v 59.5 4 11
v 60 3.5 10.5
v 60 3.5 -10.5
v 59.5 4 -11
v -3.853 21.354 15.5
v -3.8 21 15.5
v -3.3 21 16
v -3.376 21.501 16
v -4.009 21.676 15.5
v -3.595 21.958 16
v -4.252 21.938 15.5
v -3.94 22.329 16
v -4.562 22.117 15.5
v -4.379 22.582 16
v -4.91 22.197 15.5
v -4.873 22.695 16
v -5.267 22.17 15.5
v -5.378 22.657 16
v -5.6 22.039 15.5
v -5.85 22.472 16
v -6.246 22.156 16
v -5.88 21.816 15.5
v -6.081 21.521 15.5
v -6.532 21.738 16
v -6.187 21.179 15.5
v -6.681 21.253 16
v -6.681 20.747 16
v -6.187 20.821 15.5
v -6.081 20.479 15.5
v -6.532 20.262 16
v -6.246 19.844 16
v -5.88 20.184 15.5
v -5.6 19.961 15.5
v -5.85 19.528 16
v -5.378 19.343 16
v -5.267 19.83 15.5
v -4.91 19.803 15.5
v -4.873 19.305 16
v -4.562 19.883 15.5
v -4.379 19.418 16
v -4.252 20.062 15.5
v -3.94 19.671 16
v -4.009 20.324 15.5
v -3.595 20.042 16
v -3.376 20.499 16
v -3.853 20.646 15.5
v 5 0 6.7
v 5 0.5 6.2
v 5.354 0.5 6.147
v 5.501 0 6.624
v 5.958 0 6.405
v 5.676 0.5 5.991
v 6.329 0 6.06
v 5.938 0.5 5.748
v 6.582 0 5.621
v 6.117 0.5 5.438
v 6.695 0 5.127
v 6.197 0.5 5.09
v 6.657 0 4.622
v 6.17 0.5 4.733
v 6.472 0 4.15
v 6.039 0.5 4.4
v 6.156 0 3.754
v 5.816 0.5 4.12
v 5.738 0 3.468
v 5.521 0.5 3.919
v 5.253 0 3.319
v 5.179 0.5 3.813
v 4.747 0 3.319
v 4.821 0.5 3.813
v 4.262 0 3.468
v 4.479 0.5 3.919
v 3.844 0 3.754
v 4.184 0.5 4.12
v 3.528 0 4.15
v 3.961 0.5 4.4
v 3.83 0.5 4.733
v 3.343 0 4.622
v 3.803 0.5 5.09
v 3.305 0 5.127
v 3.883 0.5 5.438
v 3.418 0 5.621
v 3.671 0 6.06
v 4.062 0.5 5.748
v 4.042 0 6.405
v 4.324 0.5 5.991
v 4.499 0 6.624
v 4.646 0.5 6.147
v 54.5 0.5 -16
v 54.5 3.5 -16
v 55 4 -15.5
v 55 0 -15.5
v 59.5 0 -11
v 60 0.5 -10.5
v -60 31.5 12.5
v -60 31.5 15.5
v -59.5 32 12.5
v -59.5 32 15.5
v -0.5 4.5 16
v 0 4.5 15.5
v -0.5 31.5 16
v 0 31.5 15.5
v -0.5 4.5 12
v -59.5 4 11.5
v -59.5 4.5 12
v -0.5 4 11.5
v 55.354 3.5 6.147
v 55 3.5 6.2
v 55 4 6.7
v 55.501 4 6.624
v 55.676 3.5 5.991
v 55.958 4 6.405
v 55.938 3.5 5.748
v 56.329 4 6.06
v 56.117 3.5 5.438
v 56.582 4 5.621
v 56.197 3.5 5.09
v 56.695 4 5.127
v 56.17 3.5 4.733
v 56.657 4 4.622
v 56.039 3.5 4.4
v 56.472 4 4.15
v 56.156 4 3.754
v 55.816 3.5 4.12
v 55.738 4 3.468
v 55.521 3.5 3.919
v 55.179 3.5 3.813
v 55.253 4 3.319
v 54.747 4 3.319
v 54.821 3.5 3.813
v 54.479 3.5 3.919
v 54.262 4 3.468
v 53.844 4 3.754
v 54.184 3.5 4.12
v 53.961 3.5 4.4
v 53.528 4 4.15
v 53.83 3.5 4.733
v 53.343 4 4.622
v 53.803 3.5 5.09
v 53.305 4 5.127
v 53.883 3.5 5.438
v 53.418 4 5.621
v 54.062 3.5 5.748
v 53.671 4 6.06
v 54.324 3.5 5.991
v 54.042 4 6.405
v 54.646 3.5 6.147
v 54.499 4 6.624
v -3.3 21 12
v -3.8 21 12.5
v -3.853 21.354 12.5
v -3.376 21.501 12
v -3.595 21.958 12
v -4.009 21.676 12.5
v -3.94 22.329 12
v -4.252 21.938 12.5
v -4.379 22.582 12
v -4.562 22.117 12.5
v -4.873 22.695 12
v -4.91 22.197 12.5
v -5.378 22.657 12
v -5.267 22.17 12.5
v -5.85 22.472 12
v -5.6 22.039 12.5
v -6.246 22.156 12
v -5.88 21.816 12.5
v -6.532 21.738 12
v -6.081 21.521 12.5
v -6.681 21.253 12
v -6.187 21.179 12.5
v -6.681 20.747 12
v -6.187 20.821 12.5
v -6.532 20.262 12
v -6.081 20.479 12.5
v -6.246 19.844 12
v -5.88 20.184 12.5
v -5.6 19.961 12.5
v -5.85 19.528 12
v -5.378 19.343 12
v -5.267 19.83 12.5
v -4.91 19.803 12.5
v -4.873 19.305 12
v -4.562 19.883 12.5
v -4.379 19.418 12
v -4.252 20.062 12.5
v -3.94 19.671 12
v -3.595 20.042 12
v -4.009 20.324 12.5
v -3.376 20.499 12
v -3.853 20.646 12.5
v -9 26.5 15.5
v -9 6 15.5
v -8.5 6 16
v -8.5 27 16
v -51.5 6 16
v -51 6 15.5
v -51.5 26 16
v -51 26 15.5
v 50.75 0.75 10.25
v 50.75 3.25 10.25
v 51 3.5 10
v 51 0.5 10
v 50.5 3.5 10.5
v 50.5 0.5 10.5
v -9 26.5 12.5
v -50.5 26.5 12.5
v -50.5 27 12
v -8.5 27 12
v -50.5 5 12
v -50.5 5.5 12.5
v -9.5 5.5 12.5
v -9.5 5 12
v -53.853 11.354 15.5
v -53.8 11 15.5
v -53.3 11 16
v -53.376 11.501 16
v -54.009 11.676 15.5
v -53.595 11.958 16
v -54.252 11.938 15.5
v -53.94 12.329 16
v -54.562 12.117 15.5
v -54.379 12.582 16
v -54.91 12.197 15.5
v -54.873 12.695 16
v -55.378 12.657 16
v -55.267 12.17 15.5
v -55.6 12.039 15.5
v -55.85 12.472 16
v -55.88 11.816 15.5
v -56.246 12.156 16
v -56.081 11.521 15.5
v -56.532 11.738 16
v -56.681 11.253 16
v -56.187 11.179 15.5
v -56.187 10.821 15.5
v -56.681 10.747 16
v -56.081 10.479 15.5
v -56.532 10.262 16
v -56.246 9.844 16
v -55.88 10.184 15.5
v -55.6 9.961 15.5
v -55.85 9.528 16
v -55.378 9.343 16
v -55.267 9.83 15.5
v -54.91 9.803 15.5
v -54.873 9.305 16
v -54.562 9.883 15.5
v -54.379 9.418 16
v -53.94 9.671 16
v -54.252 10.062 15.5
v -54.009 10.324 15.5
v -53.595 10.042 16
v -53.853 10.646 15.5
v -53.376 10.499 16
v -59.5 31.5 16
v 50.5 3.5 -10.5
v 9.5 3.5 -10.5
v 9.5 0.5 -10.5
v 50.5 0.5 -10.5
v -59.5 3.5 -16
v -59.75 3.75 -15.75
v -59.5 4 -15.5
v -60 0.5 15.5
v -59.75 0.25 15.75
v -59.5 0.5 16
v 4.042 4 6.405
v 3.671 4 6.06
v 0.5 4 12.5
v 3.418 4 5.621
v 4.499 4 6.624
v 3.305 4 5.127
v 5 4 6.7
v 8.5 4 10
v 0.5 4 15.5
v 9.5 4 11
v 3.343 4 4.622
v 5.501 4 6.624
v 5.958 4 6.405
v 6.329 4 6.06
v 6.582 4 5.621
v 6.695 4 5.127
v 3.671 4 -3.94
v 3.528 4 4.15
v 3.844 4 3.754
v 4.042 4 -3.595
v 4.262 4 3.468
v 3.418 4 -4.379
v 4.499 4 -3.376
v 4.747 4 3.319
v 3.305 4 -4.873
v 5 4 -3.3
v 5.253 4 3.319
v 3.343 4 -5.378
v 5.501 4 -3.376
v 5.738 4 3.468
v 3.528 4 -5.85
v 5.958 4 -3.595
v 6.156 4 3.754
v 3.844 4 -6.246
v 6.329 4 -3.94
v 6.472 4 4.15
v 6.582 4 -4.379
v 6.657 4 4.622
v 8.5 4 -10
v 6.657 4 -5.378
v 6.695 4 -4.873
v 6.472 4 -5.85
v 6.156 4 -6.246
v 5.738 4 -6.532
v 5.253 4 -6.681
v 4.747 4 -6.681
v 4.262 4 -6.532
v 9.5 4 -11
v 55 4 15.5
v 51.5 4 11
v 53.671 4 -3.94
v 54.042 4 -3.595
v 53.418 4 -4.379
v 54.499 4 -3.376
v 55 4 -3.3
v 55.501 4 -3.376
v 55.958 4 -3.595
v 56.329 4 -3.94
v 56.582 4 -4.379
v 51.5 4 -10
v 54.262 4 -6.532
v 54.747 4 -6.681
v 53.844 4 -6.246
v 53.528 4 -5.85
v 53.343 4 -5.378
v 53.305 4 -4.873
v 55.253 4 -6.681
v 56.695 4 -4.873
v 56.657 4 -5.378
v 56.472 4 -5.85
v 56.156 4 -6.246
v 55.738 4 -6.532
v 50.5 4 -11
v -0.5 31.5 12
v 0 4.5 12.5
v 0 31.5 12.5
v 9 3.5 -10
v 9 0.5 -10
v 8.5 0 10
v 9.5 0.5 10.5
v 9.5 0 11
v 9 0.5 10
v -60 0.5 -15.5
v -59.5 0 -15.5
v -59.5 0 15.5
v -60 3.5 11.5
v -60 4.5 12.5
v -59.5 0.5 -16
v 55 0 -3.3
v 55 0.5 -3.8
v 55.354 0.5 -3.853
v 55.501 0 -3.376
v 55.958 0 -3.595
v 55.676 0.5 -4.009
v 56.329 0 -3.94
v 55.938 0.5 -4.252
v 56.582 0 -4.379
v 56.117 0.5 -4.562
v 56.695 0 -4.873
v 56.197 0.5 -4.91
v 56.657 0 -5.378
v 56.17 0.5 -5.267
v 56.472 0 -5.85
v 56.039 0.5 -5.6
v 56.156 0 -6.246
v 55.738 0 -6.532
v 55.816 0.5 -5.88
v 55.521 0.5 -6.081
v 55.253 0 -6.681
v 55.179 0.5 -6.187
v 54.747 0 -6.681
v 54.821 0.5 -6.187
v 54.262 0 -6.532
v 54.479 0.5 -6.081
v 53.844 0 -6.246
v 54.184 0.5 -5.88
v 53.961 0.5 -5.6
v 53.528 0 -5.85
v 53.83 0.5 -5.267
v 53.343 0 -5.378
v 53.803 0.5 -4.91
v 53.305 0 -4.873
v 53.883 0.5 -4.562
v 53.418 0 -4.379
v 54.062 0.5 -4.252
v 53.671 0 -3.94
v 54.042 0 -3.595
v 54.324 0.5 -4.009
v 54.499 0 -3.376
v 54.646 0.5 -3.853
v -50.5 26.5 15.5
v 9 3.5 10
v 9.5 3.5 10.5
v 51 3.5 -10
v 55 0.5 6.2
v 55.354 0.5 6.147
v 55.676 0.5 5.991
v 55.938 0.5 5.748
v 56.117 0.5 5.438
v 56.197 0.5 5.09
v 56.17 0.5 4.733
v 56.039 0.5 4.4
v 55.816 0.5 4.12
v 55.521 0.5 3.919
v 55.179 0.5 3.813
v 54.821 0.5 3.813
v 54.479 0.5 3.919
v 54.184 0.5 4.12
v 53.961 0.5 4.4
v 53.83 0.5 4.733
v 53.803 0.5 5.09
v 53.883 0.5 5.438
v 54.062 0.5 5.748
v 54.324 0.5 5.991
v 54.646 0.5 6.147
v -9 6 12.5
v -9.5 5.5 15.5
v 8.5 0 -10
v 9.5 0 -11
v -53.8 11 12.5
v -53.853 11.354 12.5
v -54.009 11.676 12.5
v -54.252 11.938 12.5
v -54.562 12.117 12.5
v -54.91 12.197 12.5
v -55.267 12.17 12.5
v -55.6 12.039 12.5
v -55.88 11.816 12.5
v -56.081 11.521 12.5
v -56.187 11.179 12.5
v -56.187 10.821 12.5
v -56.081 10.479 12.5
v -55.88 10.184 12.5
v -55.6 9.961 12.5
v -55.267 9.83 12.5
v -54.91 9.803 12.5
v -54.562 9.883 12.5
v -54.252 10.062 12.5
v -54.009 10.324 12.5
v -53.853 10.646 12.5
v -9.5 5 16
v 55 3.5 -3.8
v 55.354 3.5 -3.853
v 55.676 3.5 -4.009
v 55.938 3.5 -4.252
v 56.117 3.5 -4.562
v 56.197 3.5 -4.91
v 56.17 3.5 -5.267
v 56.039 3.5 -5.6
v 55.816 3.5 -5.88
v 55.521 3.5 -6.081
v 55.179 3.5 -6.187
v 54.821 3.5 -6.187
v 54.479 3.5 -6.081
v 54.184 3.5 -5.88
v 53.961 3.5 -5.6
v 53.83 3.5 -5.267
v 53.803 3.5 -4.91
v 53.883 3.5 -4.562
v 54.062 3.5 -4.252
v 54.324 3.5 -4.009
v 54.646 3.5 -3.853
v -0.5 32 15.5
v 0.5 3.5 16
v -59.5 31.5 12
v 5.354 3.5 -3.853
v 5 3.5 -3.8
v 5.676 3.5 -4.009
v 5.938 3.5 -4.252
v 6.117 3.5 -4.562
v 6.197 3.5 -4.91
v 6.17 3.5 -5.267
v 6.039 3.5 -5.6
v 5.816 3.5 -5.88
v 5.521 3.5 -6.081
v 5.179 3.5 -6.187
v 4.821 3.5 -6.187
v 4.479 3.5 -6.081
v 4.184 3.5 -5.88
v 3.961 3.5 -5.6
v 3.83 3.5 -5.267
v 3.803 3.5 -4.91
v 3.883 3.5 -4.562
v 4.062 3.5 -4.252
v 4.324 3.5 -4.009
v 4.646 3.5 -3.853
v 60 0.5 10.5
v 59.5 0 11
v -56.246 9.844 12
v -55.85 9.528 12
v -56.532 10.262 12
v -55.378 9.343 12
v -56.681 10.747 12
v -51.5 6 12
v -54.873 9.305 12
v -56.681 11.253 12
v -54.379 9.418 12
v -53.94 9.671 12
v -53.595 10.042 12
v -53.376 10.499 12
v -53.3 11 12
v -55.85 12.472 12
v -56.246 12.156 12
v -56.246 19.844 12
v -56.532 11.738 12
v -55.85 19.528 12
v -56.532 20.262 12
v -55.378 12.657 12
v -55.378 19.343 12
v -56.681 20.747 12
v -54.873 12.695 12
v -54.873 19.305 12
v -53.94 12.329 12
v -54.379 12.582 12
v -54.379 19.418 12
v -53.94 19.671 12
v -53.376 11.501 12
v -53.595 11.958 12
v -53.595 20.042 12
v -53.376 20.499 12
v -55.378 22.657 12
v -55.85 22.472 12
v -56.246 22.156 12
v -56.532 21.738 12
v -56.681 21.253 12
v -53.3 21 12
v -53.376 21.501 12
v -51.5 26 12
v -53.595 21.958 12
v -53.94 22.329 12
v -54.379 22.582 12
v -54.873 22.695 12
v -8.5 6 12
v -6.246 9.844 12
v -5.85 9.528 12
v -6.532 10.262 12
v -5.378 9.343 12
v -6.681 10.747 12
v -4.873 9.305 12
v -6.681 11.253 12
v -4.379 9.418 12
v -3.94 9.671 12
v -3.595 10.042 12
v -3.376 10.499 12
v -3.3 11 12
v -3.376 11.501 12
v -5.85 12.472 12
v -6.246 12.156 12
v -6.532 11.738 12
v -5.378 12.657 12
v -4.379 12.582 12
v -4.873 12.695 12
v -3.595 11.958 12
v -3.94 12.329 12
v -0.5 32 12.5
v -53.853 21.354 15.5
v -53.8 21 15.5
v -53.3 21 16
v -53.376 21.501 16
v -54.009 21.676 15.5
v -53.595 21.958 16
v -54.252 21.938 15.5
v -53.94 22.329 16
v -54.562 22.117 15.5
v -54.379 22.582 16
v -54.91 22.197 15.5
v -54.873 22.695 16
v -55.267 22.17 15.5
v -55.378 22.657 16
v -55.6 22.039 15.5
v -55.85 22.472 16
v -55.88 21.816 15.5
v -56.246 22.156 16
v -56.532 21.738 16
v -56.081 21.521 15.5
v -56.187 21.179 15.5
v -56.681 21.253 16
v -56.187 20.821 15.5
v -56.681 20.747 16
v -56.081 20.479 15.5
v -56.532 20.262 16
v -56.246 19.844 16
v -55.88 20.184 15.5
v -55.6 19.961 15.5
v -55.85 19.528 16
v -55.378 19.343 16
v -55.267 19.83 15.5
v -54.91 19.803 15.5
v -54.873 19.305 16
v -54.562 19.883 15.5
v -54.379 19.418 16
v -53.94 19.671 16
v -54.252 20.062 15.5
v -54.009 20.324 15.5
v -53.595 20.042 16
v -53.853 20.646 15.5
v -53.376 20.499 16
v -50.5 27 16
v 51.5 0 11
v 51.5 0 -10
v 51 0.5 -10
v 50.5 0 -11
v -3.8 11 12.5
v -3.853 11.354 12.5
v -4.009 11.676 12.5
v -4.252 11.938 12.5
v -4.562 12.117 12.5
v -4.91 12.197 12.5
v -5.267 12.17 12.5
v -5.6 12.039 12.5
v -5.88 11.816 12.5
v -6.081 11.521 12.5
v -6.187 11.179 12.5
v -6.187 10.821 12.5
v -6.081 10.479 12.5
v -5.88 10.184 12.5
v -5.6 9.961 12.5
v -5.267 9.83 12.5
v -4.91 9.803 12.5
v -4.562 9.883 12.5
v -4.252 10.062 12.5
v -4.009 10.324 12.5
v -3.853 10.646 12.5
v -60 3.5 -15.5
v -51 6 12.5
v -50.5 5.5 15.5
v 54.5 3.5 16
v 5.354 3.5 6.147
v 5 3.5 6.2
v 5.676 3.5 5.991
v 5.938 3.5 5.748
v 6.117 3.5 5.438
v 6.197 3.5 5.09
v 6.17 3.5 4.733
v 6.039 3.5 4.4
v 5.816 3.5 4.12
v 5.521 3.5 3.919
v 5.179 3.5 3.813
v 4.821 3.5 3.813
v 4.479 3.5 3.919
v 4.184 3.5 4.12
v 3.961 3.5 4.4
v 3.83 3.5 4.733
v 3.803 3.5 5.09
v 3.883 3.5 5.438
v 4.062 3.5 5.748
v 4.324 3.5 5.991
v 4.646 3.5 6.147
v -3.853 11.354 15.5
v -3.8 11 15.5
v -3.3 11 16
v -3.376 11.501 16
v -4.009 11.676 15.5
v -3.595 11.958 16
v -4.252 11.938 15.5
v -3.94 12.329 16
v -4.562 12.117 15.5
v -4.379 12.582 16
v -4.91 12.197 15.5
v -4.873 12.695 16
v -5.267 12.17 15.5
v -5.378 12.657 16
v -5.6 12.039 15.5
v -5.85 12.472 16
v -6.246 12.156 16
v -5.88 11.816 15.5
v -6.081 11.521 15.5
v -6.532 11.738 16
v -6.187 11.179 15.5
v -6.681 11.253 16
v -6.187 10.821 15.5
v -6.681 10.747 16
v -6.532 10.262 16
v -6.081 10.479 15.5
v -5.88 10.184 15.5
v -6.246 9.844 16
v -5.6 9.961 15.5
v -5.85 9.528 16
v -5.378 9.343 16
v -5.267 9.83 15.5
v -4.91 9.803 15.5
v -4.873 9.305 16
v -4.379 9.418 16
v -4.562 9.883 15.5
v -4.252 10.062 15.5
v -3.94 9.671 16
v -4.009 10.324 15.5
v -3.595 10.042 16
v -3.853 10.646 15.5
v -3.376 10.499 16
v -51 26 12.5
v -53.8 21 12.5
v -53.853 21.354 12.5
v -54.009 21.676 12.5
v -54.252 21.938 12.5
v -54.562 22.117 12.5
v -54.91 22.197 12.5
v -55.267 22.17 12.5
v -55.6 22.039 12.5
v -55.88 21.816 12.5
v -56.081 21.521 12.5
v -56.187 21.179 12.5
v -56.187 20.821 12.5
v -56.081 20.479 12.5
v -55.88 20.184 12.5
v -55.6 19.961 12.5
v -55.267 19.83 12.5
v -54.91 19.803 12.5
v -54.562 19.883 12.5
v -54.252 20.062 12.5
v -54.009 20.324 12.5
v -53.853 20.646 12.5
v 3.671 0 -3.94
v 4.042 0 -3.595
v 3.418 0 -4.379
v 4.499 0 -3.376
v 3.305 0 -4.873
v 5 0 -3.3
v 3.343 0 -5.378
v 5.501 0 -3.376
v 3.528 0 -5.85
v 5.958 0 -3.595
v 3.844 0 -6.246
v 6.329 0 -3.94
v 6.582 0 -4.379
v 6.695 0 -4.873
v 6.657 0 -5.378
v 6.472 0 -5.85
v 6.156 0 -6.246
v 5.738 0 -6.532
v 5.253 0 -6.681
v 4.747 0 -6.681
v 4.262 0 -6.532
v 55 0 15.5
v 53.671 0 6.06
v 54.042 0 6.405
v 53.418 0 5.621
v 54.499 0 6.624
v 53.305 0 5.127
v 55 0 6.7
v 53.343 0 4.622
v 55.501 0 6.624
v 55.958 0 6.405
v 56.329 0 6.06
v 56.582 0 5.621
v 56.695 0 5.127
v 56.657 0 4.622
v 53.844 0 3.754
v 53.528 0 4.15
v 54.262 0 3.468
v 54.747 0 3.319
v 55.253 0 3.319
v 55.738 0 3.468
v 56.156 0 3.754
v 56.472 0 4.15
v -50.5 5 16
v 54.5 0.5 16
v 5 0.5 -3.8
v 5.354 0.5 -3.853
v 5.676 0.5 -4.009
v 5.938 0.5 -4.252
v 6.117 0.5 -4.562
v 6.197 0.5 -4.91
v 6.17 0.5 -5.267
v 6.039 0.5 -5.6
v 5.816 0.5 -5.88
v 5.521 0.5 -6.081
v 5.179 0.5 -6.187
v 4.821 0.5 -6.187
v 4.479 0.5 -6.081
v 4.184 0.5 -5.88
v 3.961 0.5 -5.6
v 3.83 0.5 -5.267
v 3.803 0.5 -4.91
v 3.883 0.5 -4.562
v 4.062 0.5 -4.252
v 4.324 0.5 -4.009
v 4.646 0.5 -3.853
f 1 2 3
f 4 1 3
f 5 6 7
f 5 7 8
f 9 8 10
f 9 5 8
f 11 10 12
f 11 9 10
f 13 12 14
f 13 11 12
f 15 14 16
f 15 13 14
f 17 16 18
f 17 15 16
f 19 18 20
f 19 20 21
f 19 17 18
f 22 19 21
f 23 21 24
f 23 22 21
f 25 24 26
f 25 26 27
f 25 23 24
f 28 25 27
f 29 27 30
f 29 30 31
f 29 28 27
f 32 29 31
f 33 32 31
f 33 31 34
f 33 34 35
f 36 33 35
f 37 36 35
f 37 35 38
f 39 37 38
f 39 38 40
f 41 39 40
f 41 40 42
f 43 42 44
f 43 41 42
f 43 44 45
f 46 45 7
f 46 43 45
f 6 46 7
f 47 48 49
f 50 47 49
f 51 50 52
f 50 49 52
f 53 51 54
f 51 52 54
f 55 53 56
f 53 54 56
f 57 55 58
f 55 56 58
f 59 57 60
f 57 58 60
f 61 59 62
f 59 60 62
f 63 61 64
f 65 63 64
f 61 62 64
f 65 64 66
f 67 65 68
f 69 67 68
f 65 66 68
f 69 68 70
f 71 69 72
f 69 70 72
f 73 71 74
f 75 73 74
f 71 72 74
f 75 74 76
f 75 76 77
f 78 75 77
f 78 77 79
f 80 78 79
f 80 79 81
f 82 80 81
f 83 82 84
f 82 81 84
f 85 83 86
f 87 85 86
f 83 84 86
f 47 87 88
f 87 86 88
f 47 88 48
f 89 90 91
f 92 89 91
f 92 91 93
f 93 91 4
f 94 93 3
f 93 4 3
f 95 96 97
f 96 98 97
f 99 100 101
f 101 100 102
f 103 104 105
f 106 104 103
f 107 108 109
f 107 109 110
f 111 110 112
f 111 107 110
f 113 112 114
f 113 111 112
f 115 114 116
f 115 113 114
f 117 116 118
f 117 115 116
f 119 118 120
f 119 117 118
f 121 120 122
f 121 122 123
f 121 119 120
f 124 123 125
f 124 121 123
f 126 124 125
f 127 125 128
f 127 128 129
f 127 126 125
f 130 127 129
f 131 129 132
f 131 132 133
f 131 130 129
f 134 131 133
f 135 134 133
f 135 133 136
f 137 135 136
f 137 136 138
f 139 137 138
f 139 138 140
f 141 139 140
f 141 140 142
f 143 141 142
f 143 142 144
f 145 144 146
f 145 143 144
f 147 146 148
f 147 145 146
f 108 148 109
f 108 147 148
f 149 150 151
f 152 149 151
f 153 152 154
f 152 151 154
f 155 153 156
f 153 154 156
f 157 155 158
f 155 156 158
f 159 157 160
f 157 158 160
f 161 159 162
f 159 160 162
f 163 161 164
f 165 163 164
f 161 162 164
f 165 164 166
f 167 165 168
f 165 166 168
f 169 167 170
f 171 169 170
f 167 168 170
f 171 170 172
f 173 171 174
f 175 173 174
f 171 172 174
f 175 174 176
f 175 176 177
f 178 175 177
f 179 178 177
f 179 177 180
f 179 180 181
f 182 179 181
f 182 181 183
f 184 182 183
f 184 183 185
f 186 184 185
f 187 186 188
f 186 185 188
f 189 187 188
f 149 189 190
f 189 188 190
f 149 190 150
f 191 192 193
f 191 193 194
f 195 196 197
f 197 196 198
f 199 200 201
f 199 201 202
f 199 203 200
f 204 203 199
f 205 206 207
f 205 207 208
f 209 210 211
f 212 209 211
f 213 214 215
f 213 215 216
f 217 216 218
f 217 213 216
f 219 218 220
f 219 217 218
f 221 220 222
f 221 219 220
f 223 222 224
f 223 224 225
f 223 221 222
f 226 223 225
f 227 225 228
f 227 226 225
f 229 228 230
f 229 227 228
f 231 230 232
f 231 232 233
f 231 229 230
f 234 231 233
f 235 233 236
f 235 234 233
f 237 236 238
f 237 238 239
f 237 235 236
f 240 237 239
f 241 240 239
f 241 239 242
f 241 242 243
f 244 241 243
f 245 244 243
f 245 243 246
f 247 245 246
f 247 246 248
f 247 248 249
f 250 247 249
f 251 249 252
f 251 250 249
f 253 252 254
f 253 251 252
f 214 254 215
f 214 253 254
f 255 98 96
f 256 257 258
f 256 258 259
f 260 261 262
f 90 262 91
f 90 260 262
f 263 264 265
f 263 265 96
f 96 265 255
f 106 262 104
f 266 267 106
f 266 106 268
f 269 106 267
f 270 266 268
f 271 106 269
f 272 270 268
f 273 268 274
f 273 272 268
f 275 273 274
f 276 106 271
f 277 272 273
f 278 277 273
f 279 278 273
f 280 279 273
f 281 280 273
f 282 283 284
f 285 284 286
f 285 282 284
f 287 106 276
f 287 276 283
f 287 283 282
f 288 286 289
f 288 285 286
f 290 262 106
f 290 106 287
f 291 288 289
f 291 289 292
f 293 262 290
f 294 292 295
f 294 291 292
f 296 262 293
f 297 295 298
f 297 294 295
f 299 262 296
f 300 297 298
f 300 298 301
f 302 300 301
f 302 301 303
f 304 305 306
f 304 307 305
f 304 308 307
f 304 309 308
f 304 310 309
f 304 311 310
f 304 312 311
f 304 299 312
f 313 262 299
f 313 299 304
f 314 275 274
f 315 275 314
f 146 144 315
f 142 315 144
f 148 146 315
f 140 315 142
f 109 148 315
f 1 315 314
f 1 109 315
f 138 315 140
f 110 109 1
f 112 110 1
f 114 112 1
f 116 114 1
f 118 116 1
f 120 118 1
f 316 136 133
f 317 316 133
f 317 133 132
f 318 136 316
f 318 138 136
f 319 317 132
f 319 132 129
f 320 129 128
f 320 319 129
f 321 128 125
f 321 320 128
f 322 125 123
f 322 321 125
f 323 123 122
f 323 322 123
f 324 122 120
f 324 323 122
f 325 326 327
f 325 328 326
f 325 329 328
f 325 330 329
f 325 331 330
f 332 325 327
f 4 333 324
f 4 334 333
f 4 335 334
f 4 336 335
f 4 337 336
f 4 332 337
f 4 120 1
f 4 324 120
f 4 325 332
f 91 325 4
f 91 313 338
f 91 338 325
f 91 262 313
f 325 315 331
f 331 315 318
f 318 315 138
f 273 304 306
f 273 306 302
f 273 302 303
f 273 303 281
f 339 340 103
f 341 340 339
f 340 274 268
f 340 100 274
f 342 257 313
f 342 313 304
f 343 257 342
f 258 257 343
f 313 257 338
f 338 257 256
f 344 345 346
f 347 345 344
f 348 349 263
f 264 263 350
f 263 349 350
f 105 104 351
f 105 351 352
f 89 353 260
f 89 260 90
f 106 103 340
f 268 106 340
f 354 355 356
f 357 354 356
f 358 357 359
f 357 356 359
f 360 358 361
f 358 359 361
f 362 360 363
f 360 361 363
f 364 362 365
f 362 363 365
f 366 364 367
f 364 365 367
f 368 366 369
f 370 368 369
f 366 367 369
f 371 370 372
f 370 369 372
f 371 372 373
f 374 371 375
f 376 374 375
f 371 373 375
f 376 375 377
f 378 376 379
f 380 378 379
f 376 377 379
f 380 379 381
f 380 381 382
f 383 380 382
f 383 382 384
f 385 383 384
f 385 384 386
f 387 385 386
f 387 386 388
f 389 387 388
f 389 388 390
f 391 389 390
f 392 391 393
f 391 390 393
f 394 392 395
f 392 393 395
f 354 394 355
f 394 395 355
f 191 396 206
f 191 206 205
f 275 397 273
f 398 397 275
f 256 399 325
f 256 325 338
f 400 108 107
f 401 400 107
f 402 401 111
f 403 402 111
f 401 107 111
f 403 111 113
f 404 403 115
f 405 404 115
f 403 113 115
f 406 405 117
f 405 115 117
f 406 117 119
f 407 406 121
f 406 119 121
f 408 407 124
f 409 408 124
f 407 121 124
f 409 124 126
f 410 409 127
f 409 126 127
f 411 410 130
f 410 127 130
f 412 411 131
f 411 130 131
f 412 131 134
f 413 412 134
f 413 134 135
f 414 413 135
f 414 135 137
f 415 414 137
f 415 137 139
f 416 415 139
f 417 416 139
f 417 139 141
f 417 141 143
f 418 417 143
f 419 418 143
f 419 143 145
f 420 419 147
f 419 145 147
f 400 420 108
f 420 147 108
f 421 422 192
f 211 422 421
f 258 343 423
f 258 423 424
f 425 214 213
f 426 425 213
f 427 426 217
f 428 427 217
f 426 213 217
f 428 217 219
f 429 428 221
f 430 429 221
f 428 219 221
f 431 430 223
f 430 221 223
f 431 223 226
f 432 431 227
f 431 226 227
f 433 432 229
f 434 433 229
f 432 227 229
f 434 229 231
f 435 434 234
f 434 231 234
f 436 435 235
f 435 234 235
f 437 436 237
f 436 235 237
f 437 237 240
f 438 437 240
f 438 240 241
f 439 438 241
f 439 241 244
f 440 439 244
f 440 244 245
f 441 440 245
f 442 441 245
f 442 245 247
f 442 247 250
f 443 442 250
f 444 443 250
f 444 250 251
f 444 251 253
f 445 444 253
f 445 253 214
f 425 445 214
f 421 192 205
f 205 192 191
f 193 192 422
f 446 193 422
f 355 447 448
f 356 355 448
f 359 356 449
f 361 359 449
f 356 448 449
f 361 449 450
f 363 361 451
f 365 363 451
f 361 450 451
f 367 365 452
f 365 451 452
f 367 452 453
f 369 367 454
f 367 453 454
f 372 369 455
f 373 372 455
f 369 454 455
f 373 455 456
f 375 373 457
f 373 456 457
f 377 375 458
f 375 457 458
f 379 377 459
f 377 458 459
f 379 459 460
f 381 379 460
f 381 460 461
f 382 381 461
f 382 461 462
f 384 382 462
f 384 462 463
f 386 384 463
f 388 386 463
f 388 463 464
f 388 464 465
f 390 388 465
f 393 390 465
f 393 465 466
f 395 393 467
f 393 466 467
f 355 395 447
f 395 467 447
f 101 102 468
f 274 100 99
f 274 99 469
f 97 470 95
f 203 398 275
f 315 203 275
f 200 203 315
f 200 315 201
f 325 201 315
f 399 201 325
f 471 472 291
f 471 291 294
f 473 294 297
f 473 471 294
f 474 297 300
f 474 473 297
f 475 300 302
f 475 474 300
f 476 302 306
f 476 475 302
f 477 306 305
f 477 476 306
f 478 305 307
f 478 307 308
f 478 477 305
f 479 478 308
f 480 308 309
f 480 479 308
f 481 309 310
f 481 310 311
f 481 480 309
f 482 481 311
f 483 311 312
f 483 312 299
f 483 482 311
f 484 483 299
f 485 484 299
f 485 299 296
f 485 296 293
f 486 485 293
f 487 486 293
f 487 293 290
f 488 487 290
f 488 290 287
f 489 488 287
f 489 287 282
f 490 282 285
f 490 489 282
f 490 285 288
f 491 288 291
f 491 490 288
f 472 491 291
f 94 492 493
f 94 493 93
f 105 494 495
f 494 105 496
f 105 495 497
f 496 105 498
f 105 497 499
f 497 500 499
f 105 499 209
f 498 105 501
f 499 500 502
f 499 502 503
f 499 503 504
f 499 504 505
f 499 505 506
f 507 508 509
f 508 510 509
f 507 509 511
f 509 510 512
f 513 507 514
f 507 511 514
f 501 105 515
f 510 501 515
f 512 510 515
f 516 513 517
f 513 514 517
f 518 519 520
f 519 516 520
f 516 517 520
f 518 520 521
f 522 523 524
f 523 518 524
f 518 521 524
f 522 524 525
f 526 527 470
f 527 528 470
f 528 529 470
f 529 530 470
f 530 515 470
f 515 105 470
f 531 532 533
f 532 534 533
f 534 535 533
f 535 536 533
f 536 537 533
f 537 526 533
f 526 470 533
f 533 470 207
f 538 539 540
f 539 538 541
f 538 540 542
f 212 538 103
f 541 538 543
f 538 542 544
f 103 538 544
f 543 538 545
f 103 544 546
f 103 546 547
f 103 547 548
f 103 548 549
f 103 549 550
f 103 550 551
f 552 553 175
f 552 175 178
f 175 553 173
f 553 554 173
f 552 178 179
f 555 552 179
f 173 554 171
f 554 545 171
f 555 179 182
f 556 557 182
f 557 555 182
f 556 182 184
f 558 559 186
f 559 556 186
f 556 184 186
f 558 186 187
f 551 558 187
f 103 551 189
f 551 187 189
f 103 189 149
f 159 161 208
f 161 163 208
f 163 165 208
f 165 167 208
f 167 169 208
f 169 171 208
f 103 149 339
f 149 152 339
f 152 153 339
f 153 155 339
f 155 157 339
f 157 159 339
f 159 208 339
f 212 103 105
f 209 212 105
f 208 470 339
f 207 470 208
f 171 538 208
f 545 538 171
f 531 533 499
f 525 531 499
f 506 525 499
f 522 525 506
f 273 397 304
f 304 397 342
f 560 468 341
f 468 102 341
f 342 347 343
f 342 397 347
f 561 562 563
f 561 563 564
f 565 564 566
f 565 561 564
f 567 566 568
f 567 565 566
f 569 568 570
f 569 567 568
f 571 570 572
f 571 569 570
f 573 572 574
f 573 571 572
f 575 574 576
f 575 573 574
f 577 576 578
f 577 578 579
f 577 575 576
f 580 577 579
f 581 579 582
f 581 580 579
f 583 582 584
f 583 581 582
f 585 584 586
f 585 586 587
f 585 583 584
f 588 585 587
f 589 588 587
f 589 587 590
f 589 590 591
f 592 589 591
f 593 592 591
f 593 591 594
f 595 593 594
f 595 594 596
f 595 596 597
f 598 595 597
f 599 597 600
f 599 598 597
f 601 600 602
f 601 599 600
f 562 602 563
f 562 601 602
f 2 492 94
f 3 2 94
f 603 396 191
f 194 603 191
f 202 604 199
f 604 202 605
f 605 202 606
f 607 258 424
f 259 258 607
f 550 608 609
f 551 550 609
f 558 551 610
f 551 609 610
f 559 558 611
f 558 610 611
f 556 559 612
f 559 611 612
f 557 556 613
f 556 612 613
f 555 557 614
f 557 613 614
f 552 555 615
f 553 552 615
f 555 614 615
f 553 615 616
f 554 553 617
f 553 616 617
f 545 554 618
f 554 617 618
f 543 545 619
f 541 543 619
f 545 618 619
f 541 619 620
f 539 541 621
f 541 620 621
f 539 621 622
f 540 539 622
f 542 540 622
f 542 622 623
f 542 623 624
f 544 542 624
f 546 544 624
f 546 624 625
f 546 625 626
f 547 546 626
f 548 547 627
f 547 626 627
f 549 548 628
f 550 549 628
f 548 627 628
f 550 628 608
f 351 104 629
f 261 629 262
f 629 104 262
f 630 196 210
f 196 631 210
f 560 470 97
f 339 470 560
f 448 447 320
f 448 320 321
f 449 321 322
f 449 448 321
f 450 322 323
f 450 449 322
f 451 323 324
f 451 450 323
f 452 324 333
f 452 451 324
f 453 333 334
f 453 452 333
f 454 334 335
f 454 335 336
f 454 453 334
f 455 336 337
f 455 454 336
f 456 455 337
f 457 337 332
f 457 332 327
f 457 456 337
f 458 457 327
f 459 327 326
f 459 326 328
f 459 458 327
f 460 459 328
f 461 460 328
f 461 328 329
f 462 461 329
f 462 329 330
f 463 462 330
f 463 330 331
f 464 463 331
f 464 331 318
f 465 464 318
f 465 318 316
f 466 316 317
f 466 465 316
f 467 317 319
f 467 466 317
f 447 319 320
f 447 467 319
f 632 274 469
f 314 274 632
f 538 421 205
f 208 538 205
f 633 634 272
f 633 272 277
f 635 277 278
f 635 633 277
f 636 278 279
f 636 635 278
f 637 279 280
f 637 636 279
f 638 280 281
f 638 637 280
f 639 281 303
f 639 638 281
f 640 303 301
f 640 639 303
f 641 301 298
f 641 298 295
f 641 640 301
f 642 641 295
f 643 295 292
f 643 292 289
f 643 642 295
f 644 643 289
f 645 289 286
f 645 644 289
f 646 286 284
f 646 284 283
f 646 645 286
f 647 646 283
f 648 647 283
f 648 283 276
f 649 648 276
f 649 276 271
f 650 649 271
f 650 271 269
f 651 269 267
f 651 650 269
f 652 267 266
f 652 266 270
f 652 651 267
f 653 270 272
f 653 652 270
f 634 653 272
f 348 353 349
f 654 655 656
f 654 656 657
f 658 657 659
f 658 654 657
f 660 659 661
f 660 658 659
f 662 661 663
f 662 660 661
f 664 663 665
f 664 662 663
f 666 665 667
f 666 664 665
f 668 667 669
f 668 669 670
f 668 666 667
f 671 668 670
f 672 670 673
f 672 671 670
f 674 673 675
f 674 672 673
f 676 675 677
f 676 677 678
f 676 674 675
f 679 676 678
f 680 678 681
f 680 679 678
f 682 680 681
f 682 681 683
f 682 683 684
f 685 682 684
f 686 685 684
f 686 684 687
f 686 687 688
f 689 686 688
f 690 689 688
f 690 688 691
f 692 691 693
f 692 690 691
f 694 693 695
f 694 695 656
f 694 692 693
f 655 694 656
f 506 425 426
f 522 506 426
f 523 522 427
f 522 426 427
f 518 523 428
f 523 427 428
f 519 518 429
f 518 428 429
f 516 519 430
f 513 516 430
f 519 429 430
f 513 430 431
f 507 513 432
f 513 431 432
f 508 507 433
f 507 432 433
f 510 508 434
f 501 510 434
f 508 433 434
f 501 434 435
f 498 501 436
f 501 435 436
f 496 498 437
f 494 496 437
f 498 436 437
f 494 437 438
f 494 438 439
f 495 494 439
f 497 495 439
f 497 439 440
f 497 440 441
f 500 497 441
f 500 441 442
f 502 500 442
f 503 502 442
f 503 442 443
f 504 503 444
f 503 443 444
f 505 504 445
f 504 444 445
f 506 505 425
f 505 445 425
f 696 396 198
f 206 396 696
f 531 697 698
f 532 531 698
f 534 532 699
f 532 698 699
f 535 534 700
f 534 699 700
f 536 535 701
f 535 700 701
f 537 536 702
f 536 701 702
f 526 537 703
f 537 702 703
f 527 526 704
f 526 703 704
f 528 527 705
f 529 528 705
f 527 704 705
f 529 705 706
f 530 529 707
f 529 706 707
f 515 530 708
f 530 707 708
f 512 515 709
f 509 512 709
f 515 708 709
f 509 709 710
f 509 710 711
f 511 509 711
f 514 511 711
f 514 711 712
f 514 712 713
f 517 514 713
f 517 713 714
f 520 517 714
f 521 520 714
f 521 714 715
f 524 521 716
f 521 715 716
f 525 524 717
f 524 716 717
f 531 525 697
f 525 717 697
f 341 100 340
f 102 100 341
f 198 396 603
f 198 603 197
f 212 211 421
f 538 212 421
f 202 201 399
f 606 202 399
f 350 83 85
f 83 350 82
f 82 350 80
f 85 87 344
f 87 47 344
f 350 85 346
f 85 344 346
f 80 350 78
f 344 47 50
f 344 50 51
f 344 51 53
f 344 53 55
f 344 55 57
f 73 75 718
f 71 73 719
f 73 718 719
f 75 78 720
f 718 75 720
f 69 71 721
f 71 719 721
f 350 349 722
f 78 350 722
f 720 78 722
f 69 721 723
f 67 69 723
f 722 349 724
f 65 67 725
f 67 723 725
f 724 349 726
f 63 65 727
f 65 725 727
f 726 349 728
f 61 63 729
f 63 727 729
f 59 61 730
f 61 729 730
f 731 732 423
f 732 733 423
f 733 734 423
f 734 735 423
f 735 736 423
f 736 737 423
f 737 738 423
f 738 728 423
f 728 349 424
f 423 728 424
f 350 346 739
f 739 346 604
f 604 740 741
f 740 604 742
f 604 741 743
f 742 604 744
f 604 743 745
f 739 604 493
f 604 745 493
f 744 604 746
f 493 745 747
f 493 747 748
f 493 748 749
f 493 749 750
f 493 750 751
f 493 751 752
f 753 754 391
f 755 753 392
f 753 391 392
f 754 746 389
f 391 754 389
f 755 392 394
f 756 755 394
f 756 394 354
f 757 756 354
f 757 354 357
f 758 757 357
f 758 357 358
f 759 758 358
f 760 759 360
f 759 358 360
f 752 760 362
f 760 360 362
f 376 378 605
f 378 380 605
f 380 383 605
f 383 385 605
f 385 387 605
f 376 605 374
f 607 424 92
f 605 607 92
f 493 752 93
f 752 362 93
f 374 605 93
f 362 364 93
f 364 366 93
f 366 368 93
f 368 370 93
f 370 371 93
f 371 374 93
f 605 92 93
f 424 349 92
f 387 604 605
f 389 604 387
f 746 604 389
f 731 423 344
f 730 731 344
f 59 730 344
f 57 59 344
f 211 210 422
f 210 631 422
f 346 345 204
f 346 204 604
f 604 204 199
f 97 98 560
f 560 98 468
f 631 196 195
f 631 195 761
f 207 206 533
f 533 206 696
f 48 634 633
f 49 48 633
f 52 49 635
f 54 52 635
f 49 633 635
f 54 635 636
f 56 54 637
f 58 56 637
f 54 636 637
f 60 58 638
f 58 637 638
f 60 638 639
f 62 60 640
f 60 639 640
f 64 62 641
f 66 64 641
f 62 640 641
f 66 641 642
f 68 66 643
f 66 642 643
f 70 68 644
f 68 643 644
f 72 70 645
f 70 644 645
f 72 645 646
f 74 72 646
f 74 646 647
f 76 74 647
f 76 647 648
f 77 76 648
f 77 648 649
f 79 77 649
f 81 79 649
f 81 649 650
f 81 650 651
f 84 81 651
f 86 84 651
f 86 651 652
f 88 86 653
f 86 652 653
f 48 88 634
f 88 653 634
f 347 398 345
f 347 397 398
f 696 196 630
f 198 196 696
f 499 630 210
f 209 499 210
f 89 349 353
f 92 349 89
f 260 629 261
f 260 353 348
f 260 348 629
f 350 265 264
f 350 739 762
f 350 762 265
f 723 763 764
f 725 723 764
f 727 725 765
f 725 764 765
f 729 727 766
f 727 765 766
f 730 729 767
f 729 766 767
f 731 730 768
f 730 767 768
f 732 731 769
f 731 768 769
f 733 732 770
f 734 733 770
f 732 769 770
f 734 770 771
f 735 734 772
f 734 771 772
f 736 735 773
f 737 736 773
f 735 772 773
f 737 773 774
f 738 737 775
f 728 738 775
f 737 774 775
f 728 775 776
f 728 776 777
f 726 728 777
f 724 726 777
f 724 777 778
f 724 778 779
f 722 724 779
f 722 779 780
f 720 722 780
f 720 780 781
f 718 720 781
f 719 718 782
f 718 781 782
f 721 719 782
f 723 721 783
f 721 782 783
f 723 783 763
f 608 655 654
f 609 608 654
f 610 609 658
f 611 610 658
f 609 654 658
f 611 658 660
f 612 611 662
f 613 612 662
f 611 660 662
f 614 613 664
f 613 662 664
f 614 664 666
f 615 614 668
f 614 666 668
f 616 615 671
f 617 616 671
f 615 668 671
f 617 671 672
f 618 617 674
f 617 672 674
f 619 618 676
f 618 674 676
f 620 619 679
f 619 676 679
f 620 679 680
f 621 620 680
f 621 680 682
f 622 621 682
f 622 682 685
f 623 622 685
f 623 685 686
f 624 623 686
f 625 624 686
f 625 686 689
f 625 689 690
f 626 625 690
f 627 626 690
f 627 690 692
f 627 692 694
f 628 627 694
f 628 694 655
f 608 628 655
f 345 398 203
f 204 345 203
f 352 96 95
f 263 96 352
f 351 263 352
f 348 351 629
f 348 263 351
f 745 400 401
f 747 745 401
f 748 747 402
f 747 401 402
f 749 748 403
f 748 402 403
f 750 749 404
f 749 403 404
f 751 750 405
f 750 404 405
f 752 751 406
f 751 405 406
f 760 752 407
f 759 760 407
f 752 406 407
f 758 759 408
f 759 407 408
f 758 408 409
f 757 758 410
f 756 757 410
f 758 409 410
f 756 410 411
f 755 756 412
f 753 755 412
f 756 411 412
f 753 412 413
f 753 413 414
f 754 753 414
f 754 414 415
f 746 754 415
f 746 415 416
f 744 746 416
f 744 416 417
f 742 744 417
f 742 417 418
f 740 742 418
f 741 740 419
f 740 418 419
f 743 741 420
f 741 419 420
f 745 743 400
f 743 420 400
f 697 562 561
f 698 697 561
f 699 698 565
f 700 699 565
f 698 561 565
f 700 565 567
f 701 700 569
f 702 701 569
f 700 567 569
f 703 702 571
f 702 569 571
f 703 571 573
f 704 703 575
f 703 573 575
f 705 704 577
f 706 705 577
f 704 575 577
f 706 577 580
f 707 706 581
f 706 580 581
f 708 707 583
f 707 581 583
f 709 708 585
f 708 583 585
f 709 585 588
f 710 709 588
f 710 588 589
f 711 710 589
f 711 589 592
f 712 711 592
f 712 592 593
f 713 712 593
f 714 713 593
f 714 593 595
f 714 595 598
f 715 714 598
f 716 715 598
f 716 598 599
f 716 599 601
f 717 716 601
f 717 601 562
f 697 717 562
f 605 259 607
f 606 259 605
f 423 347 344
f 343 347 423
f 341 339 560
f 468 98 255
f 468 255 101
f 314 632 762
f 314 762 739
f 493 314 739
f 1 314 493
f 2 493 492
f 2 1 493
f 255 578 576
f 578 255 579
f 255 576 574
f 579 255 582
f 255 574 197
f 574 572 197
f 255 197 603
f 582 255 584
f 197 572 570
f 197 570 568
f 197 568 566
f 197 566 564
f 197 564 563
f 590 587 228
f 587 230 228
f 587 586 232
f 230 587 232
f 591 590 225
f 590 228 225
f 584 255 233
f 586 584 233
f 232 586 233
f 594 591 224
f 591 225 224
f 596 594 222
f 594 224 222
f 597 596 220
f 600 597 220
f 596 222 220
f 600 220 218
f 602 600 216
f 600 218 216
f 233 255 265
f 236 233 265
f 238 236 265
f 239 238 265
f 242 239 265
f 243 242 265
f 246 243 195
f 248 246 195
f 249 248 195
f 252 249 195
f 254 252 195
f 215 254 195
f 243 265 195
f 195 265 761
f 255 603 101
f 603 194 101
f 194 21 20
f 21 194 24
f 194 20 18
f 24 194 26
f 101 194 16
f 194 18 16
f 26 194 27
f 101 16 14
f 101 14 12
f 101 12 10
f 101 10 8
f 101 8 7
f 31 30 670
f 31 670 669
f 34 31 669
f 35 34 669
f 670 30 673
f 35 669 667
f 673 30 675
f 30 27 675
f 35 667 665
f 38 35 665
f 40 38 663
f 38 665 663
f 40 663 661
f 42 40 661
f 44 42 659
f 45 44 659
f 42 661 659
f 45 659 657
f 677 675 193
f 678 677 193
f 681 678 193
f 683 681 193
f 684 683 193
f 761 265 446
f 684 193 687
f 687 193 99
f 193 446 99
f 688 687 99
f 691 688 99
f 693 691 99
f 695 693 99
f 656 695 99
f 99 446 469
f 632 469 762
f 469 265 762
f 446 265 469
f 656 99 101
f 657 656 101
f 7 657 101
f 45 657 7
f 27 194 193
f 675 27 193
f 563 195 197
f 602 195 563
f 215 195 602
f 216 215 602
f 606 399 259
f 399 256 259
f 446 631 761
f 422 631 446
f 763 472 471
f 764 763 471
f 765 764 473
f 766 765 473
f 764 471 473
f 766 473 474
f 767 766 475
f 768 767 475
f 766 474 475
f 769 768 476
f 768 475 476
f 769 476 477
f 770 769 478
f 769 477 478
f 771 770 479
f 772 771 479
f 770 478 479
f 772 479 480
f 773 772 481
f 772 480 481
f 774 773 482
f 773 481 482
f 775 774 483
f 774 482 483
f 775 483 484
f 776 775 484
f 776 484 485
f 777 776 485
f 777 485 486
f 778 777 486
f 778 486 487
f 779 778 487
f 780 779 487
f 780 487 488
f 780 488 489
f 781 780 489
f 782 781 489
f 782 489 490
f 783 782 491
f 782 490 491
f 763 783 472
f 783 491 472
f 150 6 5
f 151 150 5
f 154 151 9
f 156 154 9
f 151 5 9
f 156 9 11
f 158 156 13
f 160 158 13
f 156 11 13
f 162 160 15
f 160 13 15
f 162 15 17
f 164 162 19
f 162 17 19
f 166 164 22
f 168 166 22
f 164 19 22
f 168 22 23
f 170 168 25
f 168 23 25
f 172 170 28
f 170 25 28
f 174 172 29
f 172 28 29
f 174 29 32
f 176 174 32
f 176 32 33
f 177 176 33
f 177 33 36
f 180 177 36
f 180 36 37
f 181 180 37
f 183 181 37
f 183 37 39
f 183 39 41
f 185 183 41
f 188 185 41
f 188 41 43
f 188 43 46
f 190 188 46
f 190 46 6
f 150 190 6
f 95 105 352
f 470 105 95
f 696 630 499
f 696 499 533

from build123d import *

# Parameters (mm, degrees)
SKETCH2_W           = 120
SKETCH2_H           = 32
BOSS_EXTRUDE1_DEPTH = 4
SKETCH3_R           = 1.2
SKETCH3_W           = 42
SKETCH3_H           = 21
CUT_EXTRUDE1_DEPTH  = 4
SKETCH4_W           = 60
SKETCH4_H           = 32
BOSS_EXTRUDE2_DEPTH = 4
SKETCH5_R           = 1.2
SKETCH5_W           = 42
SKETCH5_H           = 21
CUT_EXTRUDE2_DEPTH  = 76.153176912
CHAMFER1_SIZE       = 0.5
CHAMFER2_SIZE       = 0.5
CUT_EXTRUDE3_DEPTH  = 10


with BuildPart() as part:
    # Sketch2 → Boss-Extrude1 (new body)
    with BuildSketch(Plane(origin=(0, 0, 0), x_dir=(1, 0, 0), z_dir=(0, 1, 0))):
        Rectangle(SKETCH2_W, SKETCH2_H)
    extrude(amount=BOSS_EXTRUDE1_DEPTH)

    # Sketch3 → Cut-Extrude1 (cut)
    with BuildSketch(Plane(origin=(0, 4, 0), x_dir=(1, 0, 0), z_dir=(0, 1, 0))):
        with Locations(Location((55, 5, 0), (0, 0, 270))):
            Circle(SKETCH3_R)
        with Locations(Location((55, -5, 0), (0, 0, 270))):
            Circle(SKETCH3_R)
        with Locations(Location((5, 5, 0), (0, 0, 270))):
            Circle(SKETCH3_R)
        with Locations(Location((5, -5, 0), (0, 0, 270))):
            Circle(SKETCH3_R)
        with Locations((30, 0)):
            Rectangle(SKETCH3_W, SKETCH3_H)
    extrude(amount=-CUT_EXTRUDE1_DEPTH, mode=Mode.SUBTRACT)

    # Sketch4 → Boss-Extrude2 (add)
    with BuildSketch(Plane.XY.offset(16)):
        with Locations((-30, 16)):
            Rectangle(SKETCH4_W, SKETCH4_H)
    extrude(amount=-BOSS_EXTRUDE2_DEPTH)

    # Sketch5 → Cut-Extrude2 (cut, through all)
    with BuildSketch(Plane.XY.offset(16)):
        with Locations((-5, 21)):
            Circle(SKETCH5_R)
        with Locations((-5, 11)):
            Circle(SKETCH5_R)
        with Locations((-55, 21)):
            Circle(SKETCH5_R)
        with Locations((-55, 11)):
            Circle(SKETCH5_R)
        with Locations((-30, 16)):
            Rectangle(SKETCH5_W, SKETCH5_H)
    extrude(amount=-CUT_EXTRUDE2_DEPTH, mode=Mode.SUBTRACT)

    # Chamfer1
    chamfer1_edges = [part.edges().sort_by_distance(p)[0] for p in [
        (-60, 4, -2),
        (5, 0, 3.8),
        (5, 4, 3.8),
        (5, 0, -6.2),
        (5, 4, -6.2),
        (55, 0, 3.8),
        (55, 4, 3.8),
        (55, 0, -6.2),
        (55, 4, -6.2),
        (51, 0, 0),
        (51, 2, -10.5),
        (30, 0, 10.5),
        (9, 0, 0),
        (9, 2, 10.5),
        (30, 0, -10.5),
        (9, 2, -10.5),
        (51, 4, 0),
        (30, 4, -10.5),
        (9, 4, 0),
        (30, 4, 10.5),
        (60, 4, 0),
        (0, 0, 16),
        (30, 4, 16),
        (-60, 18, 12),
        (-30, 32, 12),
        (-60, 32, 14),
        (0, 4, 14),
        (0, 18, 12),
        (0, 32, 14),
        (-30, 4, 12),
        (0, 18, 16),
        (-30, 32, 16),
        (60, 0, 0),
        (-30, 26.5, 12),
        (-51, 16, 12),
        (-30, 5.5, 12),
        (-9, 16, 12),
        (0, 4, -16),
        (60, 2, 16),
        (-56.2, 11, 12),
        (-56.2, 11, 16),
        (-60, 16, 16),
        (60, 2, -16),
        (-56.2, 21, 12),
        (-56.2, 21, 16),
        (-6.2, 11, 12),
        (-6.2, 11, 16),
        (-6.2, 21, 12),
        (-6.2, 21, 16),
        (-9, 5.5, 14),
        (-51, 5.5, 14),
        (-51, 26.5, 14),
        (-9, 16, 16),
        (-30, 26.5, 16),
        (-51, 16, 16),
        (-30, 5.5, 16),
    ]]
    chamfer(chamfer1_edges, length=CHAMFER1_SIZE)

    # Chamfer2
    chamfer2_edges = [part.edges().sort_by_distance(p)[0] for p in [
        (-0.25, 0, -16),
        (51, 2, 10.5),
        (-60, 1.75, -16),
        (-60, 0, -0.25),
    ]]
    chamfer(chamfer2_edges, length=CHAMFER2_SIZE)

    # Sketch7 → Cut-Extrude3 (cut)
    with BuildSketch(Plane(origin=(0, 4, 0), x_dir=(1, 0, 0), z_dir=(0, 1, 0))):
        Polygon((54.5, 16), (60, 10.5), (63.32506638, 18.331753403), align=None)
        Polygon((54.5, -16), (60, -10.5), (62.093529184, -22.512212848), align=None)
    extrude(amount=-CUT_EXTRUDE3_DEPTH, mode=Mode.SUBTRACT)


solid = part.part
